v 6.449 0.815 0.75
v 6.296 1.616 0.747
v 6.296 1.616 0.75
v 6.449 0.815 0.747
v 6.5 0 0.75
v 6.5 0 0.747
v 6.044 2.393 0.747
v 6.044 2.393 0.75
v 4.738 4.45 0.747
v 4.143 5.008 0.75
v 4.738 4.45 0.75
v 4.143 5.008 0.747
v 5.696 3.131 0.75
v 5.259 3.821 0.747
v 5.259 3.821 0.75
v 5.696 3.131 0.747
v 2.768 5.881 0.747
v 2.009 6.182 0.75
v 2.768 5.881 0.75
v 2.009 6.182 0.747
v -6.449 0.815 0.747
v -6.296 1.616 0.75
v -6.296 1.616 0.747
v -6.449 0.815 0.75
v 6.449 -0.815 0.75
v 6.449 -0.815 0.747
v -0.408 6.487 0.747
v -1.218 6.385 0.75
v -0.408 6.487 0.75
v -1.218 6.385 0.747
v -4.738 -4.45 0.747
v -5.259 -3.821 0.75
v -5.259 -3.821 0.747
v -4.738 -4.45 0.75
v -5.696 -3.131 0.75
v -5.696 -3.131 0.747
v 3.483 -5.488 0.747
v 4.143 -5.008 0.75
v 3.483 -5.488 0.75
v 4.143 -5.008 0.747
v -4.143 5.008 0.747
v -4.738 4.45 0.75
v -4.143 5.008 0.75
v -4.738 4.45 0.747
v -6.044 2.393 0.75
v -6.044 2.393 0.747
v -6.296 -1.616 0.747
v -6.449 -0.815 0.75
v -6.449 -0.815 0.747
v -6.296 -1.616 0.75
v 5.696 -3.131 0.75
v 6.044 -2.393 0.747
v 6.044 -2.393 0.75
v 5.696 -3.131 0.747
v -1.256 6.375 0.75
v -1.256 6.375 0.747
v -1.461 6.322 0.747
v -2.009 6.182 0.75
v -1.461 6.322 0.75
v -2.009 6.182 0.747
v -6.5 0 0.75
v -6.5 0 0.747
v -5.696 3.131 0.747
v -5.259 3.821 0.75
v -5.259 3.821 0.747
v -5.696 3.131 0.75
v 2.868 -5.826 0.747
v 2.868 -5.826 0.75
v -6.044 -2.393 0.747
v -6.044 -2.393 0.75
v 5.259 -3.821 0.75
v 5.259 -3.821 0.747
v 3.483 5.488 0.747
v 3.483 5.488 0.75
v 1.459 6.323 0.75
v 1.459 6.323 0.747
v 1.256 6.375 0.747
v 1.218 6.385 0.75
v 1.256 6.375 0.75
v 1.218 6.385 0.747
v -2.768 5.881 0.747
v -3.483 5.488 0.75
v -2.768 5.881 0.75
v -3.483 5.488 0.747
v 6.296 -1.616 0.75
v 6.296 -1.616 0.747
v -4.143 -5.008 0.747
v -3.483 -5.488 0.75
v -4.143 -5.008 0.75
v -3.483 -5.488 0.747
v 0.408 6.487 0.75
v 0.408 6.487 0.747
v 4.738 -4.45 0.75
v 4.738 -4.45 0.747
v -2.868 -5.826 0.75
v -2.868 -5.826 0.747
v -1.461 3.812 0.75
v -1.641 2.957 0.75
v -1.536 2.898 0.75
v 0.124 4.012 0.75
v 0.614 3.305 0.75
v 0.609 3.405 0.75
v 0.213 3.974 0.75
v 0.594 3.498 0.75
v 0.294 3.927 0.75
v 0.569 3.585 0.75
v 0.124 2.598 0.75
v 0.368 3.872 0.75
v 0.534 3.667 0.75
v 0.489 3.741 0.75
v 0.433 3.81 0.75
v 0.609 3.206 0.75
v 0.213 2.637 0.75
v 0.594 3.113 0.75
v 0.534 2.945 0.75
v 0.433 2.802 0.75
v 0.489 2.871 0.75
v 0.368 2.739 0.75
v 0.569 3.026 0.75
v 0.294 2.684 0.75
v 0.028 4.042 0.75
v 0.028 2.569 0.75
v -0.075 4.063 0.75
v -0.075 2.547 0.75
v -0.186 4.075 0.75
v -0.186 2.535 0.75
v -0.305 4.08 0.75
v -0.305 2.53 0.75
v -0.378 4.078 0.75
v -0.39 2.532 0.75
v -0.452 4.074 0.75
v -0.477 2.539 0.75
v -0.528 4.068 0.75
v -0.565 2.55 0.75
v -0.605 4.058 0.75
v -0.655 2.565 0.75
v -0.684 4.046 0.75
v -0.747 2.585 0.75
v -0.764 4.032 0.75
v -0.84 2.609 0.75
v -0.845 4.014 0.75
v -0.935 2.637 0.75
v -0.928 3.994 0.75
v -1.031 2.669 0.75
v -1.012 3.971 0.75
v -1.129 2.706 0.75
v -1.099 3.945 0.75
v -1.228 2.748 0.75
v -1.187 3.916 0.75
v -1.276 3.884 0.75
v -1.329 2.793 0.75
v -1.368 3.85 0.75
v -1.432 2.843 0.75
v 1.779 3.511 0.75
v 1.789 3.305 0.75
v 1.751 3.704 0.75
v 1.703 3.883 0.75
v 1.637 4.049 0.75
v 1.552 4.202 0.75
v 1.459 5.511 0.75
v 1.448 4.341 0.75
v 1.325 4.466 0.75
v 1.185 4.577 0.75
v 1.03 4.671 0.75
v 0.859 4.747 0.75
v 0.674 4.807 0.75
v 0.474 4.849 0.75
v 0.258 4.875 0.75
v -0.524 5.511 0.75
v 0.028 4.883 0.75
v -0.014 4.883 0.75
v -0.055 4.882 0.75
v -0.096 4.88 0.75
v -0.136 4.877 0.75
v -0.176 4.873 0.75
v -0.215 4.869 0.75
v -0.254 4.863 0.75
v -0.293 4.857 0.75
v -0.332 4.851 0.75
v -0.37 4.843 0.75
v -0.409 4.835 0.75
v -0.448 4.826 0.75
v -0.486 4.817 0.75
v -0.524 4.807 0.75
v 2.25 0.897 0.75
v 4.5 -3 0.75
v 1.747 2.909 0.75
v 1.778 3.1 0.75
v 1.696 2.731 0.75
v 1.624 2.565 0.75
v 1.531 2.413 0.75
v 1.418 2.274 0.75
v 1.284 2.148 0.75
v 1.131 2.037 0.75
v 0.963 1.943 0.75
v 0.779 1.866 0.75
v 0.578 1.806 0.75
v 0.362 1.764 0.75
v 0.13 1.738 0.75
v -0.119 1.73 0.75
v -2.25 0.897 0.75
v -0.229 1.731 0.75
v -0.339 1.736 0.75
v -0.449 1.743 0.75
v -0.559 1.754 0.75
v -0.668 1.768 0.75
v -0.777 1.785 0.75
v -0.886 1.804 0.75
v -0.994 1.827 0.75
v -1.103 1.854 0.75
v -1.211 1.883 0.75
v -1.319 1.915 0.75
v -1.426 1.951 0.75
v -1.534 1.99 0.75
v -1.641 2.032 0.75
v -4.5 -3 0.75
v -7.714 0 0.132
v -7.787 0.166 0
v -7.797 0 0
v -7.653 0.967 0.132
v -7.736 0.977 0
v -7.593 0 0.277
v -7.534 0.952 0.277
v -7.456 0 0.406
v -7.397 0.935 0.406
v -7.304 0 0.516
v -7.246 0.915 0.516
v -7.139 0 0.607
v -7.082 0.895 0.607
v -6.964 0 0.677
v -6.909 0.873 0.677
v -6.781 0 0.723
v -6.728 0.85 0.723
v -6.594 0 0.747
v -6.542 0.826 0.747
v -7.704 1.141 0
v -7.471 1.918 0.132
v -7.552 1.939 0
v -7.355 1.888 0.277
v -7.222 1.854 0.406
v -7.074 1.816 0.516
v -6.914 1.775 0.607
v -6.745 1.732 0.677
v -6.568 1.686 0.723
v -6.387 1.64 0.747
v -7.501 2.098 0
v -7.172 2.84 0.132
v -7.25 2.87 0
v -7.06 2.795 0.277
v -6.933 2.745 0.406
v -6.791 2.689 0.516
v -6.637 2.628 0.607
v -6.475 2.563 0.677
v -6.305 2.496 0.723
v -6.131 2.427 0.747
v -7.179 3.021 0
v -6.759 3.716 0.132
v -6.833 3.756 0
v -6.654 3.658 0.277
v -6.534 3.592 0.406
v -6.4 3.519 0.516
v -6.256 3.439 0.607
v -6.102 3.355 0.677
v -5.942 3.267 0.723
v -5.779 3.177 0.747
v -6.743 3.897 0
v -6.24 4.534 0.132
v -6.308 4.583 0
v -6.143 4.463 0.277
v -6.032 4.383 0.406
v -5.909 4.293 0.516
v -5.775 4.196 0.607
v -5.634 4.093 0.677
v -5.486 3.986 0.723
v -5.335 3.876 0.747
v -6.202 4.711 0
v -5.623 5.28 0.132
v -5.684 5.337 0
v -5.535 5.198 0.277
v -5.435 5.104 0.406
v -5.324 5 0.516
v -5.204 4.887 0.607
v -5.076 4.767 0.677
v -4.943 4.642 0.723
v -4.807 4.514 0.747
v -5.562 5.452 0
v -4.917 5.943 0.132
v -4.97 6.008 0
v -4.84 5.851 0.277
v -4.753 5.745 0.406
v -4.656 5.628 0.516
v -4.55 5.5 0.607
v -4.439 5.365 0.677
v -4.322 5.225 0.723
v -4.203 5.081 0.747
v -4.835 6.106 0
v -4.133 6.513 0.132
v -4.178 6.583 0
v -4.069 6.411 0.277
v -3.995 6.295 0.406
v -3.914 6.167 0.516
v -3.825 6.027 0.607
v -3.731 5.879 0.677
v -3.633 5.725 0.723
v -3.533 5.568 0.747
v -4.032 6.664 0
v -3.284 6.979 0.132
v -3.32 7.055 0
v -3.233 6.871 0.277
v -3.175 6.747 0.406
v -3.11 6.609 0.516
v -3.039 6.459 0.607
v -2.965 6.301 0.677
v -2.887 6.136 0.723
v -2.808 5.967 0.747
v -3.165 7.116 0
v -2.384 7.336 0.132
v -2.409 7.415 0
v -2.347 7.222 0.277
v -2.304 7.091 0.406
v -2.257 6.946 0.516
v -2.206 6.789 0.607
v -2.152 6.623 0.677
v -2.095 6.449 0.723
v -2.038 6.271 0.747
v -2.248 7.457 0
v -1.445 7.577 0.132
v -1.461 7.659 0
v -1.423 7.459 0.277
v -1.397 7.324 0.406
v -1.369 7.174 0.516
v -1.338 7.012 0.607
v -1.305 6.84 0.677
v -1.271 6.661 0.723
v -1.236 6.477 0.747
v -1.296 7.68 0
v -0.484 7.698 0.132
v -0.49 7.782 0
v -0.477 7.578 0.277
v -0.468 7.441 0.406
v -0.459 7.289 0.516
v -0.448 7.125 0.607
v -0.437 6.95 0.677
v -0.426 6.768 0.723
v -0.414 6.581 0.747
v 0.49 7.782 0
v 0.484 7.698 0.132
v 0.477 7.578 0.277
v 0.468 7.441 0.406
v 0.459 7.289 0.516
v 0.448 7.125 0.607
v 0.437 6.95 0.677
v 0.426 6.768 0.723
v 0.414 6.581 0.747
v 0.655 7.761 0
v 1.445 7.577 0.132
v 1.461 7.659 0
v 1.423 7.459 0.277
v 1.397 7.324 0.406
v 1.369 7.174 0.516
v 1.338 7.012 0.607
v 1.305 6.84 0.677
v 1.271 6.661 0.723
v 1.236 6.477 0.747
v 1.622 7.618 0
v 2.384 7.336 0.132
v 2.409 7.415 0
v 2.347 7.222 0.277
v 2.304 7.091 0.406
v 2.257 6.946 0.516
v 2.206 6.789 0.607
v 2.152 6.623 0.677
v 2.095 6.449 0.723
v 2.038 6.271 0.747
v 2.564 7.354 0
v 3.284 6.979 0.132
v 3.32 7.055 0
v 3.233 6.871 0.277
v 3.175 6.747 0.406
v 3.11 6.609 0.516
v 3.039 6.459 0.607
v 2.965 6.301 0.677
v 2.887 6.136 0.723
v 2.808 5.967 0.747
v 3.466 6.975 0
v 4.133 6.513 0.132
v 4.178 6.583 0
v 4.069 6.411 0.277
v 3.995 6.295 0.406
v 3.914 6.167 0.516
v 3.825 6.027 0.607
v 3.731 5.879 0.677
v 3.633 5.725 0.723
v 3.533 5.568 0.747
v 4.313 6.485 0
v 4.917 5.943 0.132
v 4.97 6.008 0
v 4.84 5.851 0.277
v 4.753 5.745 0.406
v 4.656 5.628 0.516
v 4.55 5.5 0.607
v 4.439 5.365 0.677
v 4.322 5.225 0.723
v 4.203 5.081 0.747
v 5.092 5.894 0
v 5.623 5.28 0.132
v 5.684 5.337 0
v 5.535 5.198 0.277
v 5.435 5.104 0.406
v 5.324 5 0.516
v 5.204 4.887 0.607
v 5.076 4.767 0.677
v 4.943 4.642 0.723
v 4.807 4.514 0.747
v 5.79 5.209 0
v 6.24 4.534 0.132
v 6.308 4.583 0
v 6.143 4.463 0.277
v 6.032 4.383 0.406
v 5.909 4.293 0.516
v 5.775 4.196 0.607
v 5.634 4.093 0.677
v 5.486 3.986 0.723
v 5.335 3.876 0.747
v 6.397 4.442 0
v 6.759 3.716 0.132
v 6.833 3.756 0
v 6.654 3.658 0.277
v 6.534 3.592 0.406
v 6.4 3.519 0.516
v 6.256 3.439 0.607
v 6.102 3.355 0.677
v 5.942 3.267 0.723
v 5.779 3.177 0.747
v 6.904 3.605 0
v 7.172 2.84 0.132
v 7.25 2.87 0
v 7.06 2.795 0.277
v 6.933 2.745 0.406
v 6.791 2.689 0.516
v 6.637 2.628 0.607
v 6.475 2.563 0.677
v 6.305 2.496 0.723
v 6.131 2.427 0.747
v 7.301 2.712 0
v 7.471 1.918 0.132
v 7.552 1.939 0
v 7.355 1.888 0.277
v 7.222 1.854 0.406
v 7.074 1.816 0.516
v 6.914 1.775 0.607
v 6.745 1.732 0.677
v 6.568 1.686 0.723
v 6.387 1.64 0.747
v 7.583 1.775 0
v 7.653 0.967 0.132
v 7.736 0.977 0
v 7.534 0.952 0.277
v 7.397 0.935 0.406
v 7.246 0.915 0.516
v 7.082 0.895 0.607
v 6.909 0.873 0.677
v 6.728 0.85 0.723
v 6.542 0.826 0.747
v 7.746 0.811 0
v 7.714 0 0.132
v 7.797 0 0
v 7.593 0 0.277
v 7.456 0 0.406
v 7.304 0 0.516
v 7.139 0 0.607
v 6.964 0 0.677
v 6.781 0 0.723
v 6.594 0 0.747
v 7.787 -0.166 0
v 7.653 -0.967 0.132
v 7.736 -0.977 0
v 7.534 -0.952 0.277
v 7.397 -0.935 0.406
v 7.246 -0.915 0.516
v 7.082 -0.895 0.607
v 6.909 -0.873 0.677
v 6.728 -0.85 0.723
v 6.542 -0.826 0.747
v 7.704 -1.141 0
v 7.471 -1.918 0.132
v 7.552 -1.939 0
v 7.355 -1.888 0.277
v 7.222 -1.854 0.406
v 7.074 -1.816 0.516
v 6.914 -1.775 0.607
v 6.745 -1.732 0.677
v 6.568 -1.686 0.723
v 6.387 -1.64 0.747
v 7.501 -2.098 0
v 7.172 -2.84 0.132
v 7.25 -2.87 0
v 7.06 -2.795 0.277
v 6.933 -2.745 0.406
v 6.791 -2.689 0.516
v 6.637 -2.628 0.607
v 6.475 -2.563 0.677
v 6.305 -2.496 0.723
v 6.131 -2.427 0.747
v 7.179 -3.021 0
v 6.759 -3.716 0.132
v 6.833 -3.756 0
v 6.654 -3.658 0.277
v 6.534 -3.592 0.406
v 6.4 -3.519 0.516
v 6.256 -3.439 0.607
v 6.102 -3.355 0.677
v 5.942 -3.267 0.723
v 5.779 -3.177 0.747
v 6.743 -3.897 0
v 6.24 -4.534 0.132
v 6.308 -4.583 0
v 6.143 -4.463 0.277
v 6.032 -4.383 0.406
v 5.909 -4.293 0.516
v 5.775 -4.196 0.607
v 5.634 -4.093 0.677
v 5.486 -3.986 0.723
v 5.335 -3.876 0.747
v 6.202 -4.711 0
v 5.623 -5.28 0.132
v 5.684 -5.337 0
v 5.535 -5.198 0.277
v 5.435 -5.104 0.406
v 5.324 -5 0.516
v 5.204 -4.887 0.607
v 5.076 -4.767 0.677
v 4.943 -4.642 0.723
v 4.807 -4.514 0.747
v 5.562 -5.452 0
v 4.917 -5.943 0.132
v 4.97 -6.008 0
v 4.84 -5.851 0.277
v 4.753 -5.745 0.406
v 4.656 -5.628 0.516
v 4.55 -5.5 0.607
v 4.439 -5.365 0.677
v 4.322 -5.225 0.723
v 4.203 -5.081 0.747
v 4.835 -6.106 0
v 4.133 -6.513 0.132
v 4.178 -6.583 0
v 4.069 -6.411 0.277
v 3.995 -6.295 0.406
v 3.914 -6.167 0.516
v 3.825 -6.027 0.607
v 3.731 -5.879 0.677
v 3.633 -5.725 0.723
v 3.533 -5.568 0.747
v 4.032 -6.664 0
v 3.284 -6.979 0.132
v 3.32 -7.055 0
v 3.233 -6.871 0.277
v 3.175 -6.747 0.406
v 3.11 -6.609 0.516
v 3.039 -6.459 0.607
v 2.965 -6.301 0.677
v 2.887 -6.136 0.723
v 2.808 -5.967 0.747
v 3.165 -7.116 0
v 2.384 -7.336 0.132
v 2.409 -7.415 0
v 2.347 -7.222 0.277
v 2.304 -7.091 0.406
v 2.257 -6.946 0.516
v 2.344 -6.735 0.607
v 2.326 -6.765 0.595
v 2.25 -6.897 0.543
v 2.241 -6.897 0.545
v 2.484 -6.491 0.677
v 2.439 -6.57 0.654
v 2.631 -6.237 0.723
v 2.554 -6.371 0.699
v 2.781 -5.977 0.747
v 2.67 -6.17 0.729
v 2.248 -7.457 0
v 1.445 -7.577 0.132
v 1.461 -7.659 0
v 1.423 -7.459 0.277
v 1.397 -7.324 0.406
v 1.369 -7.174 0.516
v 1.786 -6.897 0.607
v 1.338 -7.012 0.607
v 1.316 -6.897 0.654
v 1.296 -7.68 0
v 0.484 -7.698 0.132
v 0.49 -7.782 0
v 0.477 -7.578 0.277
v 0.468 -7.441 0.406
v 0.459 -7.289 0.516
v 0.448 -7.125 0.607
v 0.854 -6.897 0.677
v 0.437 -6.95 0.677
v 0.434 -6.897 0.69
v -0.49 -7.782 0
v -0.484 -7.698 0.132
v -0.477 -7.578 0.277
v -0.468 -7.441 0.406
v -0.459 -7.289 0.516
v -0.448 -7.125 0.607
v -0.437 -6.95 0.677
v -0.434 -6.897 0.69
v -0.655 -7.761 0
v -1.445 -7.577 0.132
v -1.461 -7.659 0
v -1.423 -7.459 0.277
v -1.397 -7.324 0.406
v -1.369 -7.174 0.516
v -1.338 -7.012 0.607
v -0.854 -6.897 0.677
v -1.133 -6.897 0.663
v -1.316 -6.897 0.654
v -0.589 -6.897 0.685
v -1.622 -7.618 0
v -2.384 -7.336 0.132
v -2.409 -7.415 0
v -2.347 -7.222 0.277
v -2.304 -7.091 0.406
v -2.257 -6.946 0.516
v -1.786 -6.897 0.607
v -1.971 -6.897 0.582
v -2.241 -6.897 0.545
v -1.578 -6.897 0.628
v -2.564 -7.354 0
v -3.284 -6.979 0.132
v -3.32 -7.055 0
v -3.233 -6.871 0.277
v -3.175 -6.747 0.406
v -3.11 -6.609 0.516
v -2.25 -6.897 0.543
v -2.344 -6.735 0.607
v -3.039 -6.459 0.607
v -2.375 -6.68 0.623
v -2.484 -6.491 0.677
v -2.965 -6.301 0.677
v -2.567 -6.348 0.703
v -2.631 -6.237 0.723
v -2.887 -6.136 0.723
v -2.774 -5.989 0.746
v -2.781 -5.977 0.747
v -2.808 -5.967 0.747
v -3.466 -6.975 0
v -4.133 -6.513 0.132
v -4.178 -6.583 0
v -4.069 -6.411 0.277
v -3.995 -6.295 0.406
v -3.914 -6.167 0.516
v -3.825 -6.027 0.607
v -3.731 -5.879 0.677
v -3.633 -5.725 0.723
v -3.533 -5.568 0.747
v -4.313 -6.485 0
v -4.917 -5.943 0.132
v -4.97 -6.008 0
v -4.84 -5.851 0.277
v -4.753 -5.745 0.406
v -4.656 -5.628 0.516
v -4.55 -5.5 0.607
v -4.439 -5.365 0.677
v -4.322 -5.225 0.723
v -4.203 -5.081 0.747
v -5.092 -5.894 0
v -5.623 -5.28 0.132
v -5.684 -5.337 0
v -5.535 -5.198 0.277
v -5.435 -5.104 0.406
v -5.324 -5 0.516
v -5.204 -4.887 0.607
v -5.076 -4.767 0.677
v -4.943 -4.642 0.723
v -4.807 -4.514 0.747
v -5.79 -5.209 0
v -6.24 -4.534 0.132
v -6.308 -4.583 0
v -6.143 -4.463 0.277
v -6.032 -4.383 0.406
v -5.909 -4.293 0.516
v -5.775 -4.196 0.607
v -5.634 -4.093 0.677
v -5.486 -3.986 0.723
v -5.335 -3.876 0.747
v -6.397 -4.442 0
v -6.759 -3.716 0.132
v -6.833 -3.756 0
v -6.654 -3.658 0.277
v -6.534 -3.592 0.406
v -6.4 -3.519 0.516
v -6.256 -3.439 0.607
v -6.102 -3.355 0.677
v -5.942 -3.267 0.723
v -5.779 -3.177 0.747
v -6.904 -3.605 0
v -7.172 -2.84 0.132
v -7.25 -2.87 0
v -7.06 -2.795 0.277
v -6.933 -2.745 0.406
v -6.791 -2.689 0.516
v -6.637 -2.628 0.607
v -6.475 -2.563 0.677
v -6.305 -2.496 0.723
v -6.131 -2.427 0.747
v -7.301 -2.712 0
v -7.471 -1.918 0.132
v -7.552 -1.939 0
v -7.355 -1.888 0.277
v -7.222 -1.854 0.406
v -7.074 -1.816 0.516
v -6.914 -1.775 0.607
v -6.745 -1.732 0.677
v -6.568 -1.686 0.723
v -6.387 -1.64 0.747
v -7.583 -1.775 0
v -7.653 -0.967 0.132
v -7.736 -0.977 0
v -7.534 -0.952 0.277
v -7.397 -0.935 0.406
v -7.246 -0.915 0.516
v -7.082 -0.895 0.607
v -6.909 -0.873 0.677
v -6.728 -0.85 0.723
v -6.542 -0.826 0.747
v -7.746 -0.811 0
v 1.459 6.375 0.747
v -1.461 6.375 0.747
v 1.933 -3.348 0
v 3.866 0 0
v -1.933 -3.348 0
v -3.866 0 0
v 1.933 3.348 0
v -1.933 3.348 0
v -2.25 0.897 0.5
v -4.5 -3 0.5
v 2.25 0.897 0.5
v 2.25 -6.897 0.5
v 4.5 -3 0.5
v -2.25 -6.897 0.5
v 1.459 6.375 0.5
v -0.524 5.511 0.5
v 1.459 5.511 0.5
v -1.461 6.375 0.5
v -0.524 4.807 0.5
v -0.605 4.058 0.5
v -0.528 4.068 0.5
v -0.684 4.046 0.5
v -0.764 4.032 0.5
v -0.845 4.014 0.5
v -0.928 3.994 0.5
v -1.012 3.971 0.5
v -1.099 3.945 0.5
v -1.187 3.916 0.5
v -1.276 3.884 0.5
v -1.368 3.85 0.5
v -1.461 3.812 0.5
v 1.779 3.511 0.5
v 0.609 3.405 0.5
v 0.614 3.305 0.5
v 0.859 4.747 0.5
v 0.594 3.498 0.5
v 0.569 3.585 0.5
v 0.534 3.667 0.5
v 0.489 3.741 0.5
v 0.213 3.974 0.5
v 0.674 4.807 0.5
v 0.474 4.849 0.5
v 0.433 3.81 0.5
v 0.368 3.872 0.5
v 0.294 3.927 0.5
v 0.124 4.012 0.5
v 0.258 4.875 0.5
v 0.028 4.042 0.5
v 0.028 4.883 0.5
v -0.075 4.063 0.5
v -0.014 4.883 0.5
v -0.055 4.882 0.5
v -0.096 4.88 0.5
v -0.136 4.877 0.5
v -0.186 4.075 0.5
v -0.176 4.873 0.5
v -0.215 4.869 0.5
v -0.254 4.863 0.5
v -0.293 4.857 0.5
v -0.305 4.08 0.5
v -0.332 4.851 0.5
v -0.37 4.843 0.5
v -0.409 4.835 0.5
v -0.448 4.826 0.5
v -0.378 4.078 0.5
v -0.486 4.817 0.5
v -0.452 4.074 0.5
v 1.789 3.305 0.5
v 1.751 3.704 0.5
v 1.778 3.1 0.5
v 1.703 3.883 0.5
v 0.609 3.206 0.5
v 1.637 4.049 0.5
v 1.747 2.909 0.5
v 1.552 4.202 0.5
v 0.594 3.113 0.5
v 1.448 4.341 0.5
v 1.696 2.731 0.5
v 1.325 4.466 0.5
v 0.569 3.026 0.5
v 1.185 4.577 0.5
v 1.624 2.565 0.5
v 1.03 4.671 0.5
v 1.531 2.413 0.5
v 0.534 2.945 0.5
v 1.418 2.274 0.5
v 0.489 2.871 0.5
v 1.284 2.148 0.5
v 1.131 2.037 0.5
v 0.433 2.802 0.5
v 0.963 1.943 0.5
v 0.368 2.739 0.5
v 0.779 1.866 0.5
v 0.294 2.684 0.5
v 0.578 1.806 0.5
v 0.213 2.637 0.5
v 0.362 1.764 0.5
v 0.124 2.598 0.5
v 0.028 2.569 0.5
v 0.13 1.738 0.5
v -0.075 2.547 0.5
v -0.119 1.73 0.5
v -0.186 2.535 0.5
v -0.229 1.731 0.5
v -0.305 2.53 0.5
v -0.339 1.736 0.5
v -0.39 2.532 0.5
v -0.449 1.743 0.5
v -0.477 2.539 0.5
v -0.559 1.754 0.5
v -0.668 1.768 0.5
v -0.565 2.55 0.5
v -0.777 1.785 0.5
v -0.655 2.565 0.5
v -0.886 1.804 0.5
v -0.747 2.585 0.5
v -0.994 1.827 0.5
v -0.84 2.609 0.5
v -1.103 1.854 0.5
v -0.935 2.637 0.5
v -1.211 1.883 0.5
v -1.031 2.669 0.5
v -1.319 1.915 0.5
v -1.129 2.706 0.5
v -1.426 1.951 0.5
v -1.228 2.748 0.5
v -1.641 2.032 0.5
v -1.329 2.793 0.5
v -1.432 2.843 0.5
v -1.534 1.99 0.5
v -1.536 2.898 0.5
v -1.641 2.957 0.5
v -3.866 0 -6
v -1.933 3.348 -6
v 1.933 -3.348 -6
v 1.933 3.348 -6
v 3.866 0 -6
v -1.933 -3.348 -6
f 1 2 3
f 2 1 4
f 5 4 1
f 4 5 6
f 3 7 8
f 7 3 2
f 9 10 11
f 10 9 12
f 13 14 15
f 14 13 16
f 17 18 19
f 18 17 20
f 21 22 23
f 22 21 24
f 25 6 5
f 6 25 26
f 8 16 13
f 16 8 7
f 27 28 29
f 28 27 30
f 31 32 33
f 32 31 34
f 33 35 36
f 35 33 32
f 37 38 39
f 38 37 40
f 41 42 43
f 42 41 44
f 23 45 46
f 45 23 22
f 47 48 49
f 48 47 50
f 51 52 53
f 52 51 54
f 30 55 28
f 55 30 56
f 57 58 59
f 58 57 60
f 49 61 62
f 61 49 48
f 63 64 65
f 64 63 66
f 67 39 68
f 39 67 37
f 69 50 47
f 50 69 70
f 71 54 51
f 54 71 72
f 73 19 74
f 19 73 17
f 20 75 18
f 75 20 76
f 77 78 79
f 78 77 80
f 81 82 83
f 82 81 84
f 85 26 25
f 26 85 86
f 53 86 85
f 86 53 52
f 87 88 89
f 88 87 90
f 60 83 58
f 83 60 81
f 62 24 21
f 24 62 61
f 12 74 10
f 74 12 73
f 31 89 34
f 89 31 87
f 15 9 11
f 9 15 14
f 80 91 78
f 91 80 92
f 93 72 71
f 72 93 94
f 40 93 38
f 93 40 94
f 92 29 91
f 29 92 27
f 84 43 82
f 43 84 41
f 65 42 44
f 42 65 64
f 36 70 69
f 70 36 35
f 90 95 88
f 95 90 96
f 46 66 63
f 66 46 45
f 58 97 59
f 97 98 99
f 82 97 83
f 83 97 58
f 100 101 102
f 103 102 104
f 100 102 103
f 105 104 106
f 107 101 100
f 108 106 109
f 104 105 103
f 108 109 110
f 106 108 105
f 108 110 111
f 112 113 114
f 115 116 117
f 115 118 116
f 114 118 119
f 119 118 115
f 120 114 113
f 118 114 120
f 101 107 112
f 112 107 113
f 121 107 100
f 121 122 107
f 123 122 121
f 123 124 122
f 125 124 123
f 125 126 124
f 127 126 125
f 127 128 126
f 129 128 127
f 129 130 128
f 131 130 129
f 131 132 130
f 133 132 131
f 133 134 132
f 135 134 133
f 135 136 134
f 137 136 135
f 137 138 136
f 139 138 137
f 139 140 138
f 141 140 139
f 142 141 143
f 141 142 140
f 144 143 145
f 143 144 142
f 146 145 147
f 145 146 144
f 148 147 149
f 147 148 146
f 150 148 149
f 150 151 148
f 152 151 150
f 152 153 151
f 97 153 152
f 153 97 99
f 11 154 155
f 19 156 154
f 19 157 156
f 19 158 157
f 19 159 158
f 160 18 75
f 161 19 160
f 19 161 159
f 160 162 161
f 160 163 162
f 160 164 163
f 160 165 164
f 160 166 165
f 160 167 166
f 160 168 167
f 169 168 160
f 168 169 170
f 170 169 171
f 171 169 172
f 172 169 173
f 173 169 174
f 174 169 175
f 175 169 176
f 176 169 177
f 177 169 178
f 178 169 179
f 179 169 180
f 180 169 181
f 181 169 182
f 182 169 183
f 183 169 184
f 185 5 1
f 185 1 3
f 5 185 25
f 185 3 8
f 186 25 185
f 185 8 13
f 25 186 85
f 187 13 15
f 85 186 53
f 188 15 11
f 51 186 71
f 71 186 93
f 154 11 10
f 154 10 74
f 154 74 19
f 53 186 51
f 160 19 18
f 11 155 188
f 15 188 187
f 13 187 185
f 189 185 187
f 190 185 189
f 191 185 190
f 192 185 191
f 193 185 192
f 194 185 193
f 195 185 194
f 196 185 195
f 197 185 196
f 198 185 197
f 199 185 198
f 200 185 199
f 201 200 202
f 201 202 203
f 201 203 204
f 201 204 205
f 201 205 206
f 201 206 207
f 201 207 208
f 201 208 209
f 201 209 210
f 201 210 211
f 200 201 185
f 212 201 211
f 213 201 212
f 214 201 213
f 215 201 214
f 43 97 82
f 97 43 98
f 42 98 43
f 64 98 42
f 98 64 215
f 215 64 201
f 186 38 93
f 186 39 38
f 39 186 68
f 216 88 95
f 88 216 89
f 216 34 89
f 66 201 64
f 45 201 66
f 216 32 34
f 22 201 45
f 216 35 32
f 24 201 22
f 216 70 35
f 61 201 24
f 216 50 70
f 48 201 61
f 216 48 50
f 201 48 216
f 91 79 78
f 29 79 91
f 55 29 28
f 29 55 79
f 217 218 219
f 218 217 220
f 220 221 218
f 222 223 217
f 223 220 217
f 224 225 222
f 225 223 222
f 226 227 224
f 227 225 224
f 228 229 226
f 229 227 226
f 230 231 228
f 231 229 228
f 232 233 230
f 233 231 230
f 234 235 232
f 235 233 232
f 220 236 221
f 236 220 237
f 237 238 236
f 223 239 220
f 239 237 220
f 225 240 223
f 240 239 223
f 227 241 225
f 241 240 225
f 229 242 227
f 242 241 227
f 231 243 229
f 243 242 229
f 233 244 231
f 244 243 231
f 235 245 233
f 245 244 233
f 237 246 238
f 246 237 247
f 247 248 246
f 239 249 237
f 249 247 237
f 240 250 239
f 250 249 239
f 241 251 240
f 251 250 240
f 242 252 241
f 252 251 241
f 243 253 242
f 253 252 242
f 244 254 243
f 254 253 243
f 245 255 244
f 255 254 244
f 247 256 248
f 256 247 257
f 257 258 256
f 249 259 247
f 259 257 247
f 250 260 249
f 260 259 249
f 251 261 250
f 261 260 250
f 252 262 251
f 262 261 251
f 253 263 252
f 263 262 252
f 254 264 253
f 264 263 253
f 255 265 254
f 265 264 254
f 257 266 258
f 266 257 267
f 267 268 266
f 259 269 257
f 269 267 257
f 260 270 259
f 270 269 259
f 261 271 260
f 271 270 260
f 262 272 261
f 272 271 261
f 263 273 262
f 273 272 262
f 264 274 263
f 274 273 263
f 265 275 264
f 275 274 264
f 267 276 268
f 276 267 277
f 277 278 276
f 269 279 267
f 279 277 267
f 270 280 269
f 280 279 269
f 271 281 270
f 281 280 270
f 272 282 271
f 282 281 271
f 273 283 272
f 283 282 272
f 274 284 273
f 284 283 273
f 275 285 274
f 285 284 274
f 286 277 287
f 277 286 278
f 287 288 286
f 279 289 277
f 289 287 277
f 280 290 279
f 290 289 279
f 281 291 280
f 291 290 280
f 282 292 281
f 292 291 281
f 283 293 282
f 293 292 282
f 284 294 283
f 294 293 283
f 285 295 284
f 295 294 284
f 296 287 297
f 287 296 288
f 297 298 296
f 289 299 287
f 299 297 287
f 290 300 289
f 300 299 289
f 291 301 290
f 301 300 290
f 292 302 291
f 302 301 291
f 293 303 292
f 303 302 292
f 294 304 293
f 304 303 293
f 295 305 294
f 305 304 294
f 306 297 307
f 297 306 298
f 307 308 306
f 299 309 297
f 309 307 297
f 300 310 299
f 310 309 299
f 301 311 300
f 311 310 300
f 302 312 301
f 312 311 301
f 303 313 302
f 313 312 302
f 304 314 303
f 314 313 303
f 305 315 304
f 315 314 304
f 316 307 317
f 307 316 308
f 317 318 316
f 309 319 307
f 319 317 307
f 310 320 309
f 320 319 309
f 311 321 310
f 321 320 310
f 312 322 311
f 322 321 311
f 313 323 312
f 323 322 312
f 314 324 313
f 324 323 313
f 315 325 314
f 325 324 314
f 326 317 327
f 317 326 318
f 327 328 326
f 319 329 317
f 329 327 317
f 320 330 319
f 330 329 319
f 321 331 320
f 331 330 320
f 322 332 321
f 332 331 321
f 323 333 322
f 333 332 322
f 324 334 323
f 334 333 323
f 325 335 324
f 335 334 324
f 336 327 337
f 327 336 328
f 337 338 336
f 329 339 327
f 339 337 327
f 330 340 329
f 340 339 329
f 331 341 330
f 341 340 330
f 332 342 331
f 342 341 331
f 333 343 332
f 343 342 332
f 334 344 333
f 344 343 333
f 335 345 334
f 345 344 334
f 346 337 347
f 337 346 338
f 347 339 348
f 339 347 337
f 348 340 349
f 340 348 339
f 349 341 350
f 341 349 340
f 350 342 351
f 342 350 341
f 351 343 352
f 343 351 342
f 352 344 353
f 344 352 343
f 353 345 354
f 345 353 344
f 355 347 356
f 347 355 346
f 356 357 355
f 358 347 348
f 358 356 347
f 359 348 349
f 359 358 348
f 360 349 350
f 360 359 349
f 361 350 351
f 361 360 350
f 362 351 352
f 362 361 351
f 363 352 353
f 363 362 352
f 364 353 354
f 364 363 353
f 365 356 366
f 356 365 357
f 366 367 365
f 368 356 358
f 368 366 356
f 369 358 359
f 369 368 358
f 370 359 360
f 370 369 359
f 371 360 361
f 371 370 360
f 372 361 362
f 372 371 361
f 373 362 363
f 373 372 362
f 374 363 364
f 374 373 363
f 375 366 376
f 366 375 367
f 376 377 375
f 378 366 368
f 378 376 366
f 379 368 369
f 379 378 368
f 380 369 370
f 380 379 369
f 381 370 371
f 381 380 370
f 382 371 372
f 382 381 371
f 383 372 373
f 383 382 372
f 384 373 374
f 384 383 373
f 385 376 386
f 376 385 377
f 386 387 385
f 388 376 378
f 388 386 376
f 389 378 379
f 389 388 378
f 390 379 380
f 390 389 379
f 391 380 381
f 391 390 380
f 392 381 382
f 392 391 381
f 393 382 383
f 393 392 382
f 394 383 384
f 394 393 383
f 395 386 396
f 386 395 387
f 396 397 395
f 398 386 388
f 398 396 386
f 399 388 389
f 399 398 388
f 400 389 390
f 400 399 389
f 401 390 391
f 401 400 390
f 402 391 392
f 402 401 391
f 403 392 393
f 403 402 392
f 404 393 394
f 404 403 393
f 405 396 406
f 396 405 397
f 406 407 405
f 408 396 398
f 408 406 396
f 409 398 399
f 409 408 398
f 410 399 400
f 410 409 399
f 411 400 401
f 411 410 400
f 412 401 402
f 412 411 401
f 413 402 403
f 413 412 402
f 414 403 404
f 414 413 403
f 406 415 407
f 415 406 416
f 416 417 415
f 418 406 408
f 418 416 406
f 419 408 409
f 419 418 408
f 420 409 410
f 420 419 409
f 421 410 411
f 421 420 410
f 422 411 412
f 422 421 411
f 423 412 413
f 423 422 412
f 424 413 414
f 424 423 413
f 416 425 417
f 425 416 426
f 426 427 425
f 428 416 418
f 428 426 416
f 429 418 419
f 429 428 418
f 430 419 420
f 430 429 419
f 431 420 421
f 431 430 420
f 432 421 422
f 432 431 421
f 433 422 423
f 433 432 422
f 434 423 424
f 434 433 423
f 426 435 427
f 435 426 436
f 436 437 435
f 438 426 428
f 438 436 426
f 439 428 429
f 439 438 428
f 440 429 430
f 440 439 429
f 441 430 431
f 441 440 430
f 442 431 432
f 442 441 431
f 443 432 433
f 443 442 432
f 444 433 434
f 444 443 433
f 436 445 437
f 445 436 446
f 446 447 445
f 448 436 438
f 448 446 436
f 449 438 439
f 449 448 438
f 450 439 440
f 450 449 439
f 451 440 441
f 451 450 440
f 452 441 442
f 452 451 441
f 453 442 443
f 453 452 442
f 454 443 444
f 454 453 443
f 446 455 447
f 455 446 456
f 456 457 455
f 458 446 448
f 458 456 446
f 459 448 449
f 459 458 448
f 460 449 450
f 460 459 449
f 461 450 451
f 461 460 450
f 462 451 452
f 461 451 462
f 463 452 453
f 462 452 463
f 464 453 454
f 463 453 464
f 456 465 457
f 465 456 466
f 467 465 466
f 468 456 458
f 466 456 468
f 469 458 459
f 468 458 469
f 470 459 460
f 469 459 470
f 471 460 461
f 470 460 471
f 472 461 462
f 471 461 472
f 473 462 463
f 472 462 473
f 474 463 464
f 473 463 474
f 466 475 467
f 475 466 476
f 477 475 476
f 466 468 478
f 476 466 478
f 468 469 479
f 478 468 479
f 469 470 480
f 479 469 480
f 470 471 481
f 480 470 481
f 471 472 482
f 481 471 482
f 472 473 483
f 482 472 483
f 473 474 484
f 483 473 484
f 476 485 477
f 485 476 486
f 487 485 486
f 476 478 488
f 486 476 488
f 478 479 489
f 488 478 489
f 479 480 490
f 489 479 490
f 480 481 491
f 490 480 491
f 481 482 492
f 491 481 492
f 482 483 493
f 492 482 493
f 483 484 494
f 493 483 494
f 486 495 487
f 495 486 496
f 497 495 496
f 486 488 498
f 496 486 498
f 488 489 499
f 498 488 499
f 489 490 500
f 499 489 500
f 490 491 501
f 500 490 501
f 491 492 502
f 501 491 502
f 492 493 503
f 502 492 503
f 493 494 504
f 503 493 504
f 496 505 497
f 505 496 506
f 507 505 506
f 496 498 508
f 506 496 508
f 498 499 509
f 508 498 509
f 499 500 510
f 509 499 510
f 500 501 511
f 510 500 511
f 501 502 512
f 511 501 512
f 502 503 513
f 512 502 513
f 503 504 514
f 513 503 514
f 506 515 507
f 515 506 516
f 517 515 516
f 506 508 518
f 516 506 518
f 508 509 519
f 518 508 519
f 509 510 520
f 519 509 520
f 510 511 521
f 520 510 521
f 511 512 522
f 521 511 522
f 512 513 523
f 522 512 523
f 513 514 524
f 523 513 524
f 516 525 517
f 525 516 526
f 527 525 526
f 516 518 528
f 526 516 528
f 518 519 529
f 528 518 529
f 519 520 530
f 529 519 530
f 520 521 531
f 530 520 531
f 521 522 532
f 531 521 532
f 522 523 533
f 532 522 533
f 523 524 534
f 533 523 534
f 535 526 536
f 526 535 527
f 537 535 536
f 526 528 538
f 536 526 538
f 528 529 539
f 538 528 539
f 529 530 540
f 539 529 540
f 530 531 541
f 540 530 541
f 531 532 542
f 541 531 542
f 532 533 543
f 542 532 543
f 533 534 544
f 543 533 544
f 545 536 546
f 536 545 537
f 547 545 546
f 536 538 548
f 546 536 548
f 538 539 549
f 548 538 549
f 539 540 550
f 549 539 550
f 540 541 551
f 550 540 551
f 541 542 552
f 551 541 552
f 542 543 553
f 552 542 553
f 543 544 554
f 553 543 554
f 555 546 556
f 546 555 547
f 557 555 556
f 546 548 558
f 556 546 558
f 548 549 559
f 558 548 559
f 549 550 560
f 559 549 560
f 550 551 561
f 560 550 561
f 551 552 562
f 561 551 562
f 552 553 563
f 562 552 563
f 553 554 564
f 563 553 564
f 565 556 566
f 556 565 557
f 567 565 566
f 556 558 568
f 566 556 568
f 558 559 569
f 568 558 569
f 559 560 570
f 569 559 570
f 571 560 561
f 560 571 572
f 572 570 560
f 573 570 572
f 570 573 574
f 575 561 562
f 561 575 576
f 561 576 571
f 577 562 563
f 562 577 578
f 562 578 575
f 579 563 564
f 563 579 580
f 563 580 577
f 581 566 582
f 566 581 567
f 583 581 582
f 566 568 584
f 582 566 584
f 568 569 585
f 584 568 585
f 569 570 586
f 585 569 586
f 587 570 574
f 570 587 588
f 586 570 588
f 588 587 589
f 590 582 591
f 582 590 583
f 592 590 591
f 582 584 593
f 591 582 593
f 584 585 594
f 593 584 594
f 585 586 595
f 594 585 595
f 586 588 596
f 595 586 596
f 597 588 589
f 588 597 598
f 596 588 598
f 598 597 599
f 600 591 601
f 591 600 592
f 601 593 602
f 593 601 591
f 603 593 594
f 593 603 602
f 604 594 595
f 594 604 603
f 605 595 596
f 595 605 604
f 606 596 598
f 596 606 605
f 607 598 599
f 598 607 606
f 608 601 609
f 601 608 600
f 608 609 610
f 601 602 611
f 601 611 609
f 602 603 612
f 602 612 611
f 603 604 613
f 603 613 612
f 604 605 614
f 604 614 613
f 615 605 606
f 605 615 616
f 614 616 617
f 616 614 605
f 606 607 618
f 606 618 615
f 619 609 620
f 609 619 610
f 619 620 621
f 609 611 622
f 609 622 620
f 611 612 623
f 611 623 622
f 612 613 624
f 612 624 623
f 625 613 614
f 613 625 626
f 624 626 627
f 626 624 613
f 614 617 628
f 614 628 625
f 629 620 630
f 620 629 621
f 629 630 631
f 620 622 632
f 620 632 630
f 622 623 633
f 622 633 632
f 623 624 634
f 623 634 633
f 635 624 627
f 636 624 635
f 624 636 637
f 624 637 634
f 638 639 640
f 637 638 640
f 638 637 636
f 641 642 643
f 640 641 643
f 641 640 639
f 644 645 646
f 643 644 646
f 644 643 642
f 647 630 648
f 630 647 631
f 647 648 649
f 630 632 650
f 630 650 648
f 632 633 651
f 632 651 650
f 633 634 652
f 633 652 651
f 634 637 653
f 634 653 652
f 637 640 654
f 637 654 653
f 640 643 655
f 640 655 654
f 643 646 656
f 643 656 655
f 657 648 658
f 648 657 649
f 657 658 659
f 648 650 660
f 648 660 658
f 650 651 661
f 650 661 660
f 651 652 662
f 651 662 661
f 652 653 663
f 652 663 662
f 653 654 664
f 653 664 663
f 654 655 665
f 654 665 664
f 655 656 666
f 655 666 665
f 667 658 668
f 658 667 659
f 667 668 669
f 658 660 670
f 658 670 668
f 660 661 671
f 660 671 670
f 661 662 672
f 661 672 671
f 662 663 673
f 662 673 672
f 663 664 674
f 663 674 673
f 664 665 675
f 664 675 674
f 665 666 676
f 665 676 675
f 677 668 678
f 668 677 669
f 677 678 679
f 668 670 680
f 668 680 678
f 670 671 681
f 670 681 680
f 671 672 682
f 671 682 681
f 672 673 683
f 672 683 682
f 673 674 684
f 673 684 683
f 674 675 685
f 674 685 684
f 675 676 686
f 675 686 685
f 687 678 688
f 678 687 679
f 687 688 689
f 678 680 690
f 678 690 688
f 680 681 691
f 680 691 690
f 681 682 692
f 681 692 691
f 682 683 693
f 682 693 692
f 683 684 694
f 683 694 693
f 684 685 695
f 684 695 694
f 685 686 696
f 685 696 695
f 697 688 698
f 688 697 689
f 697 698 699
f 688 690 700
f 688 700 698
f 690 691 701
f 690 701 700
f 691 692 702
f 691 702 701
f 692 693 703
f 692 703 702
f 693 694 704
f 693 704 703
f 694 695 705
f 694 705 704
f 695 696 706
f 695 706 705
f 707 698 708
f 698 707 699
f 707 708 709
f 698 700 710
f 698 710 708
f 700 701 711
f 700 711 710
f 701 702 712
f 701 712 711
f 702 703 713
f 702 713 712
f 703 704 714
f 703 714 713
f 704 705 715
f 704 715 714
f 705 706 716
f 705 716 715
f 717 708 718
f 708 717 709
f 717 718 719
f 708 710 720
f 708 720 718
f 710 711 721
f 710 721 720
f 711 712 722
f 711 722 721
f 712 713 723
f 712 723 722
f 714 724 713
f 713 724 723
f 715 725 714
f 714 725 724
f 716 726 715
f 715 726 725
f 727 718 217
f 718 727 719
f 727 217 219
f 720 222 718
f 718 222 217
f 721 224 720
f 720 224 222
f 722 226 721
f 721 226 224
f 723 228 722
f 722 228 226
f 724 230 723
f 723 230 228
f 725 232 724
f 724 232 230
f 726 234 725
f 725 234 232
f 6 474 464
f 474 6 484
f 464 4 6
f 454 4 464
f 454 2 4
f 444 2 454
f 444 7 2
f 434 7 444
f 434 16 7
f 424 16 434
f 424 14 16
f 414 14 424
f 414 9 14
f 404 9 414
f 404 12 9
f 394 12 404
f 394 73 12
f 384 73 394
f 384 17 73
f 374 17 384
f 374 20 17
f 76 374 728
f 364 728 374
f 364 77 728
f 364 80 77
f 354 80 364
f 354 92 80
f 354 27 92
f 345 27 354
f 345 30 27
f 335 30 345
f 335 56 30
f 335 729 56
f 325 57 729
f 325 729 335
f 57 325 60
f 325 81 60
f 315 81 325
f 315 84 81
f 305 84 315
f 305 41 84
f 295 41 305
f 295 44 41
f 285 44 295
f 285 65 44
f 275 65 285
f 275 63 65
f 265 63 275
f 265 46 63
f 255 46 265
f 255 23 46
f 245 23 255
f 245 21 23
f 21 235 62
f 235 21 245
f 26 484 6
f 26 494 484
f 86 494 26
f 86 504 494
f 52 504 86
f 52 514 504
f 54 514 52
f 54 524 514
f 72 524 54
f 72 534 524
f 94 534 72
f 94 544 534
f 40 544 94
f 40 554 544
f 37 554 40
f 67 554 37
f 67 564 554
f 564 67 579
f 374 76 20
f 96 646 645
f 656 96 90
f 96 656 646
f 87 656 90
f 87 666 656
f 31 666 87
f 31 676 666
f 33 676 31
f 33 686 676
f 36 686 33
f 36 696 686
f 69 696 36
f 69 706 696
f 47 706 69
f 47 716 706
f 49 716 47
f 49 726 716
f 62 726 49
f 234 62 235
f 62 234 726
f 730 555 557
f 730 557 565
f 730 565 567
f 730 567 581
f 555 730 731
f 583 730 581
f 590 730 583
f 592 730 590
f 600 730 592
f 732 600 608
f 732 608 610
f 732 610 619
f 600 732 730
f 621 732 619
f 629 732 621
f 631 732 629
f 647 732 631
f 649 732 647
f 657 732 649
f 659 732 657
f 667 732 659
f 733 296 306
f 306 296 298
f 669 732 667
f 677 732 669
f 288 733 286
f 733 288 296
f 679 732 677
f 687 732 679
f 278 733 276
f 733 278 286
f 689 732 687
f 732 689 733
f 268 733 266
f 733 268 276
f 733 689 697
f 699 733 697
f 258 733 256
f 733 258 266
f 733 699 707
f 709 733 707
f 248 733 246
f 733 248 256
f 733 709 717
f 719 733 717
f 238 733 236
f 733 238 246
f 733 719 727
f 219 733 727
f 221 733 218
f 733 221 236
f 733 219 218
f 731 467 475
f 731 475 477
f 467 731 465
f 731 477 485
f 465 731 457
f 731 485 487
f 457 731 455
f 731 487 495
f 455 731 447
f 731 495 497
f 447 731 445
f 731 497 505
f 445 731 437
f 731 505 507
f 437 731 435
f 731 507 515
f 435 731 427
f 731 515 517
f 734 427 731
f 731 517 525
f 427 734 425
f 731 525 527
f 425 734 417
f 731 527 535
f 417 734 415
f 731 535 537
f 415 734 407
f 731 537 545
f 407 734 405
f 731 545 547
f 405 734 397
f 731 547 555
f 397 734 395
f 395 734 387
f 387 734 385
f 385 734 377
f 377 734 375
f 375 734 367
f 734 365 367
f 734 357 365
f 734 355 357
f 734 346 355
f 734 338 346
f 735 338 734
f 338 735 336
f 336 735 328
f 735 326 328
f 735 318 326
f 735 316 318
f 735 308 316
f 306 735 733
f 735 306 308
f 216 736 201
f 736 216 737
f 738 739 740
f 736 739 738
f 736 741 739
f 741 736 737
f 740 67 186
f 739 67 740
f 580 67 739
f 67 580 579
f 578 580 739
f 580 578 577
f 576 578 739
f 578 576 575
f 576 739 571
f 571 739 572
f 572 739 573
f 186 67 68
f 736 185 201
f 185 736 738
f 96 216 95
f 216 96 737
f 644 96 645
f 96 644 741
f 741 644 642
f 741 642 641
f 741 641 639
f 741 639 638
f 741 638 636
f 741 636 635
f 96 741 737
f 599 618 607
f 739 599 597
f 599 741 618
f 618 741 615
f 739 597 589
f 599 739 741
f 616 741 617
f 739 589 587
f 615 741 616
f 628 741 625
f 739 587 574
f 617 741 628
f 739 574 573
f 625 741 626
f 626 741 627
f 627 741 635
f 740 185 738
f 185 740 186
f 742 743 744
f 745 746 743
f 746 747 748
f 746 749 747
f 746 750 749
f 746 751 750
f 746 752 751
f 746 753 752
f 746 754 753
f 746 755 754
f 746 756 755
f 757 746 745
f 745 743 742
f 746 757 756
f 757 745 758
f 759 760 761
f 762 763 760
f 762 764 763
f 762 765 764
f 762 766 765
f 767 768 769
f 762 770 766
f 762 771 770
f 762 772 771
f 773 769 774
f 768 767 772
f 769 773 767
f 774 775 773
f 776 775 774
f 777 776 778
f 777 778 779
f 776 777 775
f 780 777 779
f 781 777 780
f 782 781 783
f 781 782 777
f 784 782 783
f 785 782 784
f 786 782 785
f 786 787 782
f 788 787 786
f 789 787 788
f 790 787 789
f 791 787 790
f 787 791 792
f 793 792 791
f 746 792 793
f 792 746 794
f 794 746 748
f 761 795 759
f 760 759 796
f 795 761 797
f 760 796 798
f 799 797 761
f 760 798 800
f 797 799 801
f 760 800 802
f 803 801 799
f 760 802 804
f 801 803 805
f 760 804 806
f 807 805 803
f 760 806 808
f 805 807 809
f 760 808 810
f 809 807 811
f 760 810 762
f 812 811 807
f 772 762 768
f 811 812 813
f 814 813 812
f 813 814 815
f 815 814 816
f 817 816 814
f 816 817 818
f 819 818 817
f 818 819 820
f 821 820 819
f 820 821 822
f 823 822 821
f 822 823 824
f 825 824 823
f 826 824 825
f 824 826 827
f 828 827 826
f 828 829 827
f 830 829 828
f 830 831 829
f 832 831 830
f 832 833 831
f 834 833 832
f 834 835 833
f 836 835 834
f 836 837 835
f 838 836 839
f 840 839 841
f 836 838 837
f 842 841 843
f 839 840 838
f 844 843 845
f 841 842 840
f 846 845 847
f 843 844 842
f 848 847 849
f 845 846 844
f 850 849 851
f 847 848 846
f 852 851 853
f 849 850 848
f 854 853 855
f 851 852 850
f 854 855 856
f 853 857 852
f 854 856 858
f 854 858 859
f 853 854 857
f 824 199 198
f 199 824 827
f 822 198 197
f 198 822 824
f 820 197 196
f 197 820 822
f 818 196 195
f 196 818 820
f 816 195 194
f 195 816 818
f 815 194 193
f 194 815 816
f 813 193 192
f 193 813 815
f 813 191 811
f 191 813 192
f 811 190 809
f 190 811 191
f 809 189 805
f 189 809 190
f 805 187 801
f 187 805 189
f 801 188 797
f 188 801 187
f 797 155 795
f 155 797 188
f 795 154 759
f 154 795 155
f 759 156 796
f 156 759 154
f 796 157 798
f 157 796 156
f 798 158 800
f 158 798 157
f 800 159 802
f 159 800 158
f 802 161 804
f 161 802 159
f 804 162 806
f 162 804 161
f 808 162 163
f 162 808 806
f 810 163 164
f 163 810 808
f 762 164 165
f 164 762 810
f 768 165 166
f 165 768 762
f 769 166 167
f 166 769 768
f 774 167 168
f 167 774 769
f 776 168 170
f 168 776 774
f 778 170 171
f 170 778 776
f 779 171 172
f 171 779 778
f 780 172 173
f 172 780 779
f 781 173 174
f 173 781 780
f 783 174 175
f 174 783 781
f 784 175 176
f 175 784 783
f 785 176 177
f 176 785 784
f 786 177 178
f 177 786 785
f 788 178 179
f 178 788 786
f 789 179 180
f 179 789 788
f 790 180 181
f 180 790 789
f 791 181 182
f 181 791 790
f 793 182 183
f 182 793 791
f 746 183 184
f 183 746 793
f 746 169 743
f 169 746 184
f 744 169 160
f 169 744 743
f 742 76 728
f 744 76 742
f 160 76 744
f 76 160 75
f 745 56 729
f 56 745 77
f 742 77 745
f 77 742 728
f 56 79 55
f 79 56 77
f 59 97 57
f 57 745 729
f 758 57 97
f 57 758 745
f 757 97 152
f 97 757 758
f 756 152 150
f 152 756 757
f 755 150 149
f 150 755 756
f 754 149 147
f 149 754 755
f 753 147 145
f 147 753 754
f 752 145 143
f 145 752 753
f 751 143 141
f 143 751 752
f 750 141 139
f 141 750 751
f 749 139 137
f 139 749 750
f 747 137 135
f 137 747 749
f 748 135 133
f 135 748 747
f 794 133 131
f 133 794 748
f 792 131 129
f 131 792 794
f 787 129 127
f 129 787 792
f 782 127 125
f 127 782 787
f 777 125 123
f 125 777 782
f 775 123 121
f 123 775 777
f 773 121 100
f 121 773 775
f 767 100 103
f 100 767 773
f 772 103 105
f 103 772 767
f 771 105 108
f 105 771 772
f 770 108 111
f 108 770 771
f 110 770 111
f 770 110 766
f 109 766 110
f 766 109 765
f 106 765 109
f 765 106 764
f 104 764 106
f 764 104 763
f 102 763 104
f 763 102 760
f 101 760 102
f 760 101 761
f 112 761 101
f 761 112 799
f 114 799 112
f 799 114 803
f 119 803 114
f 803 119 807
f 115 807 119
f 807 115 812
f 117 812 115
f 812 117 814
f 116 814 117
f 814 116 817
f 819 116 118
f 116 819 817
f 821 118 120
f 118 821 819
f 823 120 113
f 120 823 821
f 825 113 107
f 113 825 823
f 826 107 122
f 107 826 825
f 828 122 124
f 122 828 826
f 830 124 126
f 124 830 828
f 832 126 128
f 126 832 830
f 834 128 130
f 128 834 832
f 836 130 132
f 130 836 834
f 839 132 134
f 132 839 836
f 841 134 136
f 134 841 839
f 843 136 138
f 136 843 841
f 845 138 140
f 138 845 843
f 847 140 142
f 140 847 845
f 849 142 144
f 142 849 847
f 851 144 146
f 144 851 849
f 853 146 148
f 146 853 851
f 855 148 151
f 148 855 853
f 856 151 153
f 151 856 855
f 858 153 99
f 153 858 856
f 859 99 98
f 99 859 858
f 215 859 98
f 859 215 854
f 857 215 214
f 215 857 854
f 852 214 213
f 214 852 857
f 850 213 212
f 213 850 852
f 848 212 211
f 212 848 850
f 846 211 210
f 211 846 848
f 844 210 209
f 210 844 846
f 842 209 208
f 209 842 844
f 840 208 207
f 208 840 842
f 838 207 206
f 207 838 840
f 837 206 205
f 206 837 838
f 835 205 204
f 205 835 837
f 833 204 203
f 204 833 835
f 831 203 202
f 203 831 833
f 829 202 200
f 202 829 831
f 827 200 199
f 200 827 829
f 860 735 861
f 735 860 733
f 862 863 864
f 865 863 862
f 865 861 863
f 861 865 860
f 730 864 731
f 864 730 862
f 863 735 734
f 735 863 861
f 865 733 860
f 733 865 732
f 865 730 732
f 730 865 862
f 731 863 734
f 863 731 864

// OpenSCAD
$fn = 50;


union() {
	difference() {
		union() {
			translate(v = [0, 0, -0.7500000000]) {
				cylinder(h = 1.5000000000, r = 6.5000000000);
			}
			translate(v = [0, 0, -0.7500000000]) {
				rotate_extrude(angle = 360) {
					translate(v = [6.5000000000, 0, 0]) {
						circle(r = 1.5000000000);
					}
				}
			}
		}
		union() {
			translate(v = [-25.0000000000, -25.0000000000, -50]) {
				cube(size = [50, 50, 50]);
			}
			translate(v = [0, -3, 0.5000000000]) {
				#linear_extrude(height = 0.2500000000) {
					polygon(points = [[4.5000000000, 0.0000000000], [2.2500000000, 3.8971143170], [-2.2500000000, 3.8971143170], [-4.5000000000, 0.0000000000], [-2.2500000000, -3.8971143170], [2.2500000000, -3.8971143170]]);
				}
			}
			#translate(v = [0, 4, 0.5000000000]) {
				linear_extrude(height = 0.2500000000) {
					text(font = "SegoiUI:Bold", halign = "center", size = 4.5000000000, text = "5", valign = "center");
				}
			}
		}
	}
	union() {
		translate(v = [0, 0, -6]) {
			linear_extrude(height = 6) {
				polygon(points = [[3.8658550000, 0.0000000000], [1.9329275000, 3.3479286373], [-1.9329275000, 3.3479286373], [-3.8658550000, 0.0000000000], [-1.9329275000, -3.3479286373], [1.9329275000, -3.3479286373]]);
			}
		}
	}
}
